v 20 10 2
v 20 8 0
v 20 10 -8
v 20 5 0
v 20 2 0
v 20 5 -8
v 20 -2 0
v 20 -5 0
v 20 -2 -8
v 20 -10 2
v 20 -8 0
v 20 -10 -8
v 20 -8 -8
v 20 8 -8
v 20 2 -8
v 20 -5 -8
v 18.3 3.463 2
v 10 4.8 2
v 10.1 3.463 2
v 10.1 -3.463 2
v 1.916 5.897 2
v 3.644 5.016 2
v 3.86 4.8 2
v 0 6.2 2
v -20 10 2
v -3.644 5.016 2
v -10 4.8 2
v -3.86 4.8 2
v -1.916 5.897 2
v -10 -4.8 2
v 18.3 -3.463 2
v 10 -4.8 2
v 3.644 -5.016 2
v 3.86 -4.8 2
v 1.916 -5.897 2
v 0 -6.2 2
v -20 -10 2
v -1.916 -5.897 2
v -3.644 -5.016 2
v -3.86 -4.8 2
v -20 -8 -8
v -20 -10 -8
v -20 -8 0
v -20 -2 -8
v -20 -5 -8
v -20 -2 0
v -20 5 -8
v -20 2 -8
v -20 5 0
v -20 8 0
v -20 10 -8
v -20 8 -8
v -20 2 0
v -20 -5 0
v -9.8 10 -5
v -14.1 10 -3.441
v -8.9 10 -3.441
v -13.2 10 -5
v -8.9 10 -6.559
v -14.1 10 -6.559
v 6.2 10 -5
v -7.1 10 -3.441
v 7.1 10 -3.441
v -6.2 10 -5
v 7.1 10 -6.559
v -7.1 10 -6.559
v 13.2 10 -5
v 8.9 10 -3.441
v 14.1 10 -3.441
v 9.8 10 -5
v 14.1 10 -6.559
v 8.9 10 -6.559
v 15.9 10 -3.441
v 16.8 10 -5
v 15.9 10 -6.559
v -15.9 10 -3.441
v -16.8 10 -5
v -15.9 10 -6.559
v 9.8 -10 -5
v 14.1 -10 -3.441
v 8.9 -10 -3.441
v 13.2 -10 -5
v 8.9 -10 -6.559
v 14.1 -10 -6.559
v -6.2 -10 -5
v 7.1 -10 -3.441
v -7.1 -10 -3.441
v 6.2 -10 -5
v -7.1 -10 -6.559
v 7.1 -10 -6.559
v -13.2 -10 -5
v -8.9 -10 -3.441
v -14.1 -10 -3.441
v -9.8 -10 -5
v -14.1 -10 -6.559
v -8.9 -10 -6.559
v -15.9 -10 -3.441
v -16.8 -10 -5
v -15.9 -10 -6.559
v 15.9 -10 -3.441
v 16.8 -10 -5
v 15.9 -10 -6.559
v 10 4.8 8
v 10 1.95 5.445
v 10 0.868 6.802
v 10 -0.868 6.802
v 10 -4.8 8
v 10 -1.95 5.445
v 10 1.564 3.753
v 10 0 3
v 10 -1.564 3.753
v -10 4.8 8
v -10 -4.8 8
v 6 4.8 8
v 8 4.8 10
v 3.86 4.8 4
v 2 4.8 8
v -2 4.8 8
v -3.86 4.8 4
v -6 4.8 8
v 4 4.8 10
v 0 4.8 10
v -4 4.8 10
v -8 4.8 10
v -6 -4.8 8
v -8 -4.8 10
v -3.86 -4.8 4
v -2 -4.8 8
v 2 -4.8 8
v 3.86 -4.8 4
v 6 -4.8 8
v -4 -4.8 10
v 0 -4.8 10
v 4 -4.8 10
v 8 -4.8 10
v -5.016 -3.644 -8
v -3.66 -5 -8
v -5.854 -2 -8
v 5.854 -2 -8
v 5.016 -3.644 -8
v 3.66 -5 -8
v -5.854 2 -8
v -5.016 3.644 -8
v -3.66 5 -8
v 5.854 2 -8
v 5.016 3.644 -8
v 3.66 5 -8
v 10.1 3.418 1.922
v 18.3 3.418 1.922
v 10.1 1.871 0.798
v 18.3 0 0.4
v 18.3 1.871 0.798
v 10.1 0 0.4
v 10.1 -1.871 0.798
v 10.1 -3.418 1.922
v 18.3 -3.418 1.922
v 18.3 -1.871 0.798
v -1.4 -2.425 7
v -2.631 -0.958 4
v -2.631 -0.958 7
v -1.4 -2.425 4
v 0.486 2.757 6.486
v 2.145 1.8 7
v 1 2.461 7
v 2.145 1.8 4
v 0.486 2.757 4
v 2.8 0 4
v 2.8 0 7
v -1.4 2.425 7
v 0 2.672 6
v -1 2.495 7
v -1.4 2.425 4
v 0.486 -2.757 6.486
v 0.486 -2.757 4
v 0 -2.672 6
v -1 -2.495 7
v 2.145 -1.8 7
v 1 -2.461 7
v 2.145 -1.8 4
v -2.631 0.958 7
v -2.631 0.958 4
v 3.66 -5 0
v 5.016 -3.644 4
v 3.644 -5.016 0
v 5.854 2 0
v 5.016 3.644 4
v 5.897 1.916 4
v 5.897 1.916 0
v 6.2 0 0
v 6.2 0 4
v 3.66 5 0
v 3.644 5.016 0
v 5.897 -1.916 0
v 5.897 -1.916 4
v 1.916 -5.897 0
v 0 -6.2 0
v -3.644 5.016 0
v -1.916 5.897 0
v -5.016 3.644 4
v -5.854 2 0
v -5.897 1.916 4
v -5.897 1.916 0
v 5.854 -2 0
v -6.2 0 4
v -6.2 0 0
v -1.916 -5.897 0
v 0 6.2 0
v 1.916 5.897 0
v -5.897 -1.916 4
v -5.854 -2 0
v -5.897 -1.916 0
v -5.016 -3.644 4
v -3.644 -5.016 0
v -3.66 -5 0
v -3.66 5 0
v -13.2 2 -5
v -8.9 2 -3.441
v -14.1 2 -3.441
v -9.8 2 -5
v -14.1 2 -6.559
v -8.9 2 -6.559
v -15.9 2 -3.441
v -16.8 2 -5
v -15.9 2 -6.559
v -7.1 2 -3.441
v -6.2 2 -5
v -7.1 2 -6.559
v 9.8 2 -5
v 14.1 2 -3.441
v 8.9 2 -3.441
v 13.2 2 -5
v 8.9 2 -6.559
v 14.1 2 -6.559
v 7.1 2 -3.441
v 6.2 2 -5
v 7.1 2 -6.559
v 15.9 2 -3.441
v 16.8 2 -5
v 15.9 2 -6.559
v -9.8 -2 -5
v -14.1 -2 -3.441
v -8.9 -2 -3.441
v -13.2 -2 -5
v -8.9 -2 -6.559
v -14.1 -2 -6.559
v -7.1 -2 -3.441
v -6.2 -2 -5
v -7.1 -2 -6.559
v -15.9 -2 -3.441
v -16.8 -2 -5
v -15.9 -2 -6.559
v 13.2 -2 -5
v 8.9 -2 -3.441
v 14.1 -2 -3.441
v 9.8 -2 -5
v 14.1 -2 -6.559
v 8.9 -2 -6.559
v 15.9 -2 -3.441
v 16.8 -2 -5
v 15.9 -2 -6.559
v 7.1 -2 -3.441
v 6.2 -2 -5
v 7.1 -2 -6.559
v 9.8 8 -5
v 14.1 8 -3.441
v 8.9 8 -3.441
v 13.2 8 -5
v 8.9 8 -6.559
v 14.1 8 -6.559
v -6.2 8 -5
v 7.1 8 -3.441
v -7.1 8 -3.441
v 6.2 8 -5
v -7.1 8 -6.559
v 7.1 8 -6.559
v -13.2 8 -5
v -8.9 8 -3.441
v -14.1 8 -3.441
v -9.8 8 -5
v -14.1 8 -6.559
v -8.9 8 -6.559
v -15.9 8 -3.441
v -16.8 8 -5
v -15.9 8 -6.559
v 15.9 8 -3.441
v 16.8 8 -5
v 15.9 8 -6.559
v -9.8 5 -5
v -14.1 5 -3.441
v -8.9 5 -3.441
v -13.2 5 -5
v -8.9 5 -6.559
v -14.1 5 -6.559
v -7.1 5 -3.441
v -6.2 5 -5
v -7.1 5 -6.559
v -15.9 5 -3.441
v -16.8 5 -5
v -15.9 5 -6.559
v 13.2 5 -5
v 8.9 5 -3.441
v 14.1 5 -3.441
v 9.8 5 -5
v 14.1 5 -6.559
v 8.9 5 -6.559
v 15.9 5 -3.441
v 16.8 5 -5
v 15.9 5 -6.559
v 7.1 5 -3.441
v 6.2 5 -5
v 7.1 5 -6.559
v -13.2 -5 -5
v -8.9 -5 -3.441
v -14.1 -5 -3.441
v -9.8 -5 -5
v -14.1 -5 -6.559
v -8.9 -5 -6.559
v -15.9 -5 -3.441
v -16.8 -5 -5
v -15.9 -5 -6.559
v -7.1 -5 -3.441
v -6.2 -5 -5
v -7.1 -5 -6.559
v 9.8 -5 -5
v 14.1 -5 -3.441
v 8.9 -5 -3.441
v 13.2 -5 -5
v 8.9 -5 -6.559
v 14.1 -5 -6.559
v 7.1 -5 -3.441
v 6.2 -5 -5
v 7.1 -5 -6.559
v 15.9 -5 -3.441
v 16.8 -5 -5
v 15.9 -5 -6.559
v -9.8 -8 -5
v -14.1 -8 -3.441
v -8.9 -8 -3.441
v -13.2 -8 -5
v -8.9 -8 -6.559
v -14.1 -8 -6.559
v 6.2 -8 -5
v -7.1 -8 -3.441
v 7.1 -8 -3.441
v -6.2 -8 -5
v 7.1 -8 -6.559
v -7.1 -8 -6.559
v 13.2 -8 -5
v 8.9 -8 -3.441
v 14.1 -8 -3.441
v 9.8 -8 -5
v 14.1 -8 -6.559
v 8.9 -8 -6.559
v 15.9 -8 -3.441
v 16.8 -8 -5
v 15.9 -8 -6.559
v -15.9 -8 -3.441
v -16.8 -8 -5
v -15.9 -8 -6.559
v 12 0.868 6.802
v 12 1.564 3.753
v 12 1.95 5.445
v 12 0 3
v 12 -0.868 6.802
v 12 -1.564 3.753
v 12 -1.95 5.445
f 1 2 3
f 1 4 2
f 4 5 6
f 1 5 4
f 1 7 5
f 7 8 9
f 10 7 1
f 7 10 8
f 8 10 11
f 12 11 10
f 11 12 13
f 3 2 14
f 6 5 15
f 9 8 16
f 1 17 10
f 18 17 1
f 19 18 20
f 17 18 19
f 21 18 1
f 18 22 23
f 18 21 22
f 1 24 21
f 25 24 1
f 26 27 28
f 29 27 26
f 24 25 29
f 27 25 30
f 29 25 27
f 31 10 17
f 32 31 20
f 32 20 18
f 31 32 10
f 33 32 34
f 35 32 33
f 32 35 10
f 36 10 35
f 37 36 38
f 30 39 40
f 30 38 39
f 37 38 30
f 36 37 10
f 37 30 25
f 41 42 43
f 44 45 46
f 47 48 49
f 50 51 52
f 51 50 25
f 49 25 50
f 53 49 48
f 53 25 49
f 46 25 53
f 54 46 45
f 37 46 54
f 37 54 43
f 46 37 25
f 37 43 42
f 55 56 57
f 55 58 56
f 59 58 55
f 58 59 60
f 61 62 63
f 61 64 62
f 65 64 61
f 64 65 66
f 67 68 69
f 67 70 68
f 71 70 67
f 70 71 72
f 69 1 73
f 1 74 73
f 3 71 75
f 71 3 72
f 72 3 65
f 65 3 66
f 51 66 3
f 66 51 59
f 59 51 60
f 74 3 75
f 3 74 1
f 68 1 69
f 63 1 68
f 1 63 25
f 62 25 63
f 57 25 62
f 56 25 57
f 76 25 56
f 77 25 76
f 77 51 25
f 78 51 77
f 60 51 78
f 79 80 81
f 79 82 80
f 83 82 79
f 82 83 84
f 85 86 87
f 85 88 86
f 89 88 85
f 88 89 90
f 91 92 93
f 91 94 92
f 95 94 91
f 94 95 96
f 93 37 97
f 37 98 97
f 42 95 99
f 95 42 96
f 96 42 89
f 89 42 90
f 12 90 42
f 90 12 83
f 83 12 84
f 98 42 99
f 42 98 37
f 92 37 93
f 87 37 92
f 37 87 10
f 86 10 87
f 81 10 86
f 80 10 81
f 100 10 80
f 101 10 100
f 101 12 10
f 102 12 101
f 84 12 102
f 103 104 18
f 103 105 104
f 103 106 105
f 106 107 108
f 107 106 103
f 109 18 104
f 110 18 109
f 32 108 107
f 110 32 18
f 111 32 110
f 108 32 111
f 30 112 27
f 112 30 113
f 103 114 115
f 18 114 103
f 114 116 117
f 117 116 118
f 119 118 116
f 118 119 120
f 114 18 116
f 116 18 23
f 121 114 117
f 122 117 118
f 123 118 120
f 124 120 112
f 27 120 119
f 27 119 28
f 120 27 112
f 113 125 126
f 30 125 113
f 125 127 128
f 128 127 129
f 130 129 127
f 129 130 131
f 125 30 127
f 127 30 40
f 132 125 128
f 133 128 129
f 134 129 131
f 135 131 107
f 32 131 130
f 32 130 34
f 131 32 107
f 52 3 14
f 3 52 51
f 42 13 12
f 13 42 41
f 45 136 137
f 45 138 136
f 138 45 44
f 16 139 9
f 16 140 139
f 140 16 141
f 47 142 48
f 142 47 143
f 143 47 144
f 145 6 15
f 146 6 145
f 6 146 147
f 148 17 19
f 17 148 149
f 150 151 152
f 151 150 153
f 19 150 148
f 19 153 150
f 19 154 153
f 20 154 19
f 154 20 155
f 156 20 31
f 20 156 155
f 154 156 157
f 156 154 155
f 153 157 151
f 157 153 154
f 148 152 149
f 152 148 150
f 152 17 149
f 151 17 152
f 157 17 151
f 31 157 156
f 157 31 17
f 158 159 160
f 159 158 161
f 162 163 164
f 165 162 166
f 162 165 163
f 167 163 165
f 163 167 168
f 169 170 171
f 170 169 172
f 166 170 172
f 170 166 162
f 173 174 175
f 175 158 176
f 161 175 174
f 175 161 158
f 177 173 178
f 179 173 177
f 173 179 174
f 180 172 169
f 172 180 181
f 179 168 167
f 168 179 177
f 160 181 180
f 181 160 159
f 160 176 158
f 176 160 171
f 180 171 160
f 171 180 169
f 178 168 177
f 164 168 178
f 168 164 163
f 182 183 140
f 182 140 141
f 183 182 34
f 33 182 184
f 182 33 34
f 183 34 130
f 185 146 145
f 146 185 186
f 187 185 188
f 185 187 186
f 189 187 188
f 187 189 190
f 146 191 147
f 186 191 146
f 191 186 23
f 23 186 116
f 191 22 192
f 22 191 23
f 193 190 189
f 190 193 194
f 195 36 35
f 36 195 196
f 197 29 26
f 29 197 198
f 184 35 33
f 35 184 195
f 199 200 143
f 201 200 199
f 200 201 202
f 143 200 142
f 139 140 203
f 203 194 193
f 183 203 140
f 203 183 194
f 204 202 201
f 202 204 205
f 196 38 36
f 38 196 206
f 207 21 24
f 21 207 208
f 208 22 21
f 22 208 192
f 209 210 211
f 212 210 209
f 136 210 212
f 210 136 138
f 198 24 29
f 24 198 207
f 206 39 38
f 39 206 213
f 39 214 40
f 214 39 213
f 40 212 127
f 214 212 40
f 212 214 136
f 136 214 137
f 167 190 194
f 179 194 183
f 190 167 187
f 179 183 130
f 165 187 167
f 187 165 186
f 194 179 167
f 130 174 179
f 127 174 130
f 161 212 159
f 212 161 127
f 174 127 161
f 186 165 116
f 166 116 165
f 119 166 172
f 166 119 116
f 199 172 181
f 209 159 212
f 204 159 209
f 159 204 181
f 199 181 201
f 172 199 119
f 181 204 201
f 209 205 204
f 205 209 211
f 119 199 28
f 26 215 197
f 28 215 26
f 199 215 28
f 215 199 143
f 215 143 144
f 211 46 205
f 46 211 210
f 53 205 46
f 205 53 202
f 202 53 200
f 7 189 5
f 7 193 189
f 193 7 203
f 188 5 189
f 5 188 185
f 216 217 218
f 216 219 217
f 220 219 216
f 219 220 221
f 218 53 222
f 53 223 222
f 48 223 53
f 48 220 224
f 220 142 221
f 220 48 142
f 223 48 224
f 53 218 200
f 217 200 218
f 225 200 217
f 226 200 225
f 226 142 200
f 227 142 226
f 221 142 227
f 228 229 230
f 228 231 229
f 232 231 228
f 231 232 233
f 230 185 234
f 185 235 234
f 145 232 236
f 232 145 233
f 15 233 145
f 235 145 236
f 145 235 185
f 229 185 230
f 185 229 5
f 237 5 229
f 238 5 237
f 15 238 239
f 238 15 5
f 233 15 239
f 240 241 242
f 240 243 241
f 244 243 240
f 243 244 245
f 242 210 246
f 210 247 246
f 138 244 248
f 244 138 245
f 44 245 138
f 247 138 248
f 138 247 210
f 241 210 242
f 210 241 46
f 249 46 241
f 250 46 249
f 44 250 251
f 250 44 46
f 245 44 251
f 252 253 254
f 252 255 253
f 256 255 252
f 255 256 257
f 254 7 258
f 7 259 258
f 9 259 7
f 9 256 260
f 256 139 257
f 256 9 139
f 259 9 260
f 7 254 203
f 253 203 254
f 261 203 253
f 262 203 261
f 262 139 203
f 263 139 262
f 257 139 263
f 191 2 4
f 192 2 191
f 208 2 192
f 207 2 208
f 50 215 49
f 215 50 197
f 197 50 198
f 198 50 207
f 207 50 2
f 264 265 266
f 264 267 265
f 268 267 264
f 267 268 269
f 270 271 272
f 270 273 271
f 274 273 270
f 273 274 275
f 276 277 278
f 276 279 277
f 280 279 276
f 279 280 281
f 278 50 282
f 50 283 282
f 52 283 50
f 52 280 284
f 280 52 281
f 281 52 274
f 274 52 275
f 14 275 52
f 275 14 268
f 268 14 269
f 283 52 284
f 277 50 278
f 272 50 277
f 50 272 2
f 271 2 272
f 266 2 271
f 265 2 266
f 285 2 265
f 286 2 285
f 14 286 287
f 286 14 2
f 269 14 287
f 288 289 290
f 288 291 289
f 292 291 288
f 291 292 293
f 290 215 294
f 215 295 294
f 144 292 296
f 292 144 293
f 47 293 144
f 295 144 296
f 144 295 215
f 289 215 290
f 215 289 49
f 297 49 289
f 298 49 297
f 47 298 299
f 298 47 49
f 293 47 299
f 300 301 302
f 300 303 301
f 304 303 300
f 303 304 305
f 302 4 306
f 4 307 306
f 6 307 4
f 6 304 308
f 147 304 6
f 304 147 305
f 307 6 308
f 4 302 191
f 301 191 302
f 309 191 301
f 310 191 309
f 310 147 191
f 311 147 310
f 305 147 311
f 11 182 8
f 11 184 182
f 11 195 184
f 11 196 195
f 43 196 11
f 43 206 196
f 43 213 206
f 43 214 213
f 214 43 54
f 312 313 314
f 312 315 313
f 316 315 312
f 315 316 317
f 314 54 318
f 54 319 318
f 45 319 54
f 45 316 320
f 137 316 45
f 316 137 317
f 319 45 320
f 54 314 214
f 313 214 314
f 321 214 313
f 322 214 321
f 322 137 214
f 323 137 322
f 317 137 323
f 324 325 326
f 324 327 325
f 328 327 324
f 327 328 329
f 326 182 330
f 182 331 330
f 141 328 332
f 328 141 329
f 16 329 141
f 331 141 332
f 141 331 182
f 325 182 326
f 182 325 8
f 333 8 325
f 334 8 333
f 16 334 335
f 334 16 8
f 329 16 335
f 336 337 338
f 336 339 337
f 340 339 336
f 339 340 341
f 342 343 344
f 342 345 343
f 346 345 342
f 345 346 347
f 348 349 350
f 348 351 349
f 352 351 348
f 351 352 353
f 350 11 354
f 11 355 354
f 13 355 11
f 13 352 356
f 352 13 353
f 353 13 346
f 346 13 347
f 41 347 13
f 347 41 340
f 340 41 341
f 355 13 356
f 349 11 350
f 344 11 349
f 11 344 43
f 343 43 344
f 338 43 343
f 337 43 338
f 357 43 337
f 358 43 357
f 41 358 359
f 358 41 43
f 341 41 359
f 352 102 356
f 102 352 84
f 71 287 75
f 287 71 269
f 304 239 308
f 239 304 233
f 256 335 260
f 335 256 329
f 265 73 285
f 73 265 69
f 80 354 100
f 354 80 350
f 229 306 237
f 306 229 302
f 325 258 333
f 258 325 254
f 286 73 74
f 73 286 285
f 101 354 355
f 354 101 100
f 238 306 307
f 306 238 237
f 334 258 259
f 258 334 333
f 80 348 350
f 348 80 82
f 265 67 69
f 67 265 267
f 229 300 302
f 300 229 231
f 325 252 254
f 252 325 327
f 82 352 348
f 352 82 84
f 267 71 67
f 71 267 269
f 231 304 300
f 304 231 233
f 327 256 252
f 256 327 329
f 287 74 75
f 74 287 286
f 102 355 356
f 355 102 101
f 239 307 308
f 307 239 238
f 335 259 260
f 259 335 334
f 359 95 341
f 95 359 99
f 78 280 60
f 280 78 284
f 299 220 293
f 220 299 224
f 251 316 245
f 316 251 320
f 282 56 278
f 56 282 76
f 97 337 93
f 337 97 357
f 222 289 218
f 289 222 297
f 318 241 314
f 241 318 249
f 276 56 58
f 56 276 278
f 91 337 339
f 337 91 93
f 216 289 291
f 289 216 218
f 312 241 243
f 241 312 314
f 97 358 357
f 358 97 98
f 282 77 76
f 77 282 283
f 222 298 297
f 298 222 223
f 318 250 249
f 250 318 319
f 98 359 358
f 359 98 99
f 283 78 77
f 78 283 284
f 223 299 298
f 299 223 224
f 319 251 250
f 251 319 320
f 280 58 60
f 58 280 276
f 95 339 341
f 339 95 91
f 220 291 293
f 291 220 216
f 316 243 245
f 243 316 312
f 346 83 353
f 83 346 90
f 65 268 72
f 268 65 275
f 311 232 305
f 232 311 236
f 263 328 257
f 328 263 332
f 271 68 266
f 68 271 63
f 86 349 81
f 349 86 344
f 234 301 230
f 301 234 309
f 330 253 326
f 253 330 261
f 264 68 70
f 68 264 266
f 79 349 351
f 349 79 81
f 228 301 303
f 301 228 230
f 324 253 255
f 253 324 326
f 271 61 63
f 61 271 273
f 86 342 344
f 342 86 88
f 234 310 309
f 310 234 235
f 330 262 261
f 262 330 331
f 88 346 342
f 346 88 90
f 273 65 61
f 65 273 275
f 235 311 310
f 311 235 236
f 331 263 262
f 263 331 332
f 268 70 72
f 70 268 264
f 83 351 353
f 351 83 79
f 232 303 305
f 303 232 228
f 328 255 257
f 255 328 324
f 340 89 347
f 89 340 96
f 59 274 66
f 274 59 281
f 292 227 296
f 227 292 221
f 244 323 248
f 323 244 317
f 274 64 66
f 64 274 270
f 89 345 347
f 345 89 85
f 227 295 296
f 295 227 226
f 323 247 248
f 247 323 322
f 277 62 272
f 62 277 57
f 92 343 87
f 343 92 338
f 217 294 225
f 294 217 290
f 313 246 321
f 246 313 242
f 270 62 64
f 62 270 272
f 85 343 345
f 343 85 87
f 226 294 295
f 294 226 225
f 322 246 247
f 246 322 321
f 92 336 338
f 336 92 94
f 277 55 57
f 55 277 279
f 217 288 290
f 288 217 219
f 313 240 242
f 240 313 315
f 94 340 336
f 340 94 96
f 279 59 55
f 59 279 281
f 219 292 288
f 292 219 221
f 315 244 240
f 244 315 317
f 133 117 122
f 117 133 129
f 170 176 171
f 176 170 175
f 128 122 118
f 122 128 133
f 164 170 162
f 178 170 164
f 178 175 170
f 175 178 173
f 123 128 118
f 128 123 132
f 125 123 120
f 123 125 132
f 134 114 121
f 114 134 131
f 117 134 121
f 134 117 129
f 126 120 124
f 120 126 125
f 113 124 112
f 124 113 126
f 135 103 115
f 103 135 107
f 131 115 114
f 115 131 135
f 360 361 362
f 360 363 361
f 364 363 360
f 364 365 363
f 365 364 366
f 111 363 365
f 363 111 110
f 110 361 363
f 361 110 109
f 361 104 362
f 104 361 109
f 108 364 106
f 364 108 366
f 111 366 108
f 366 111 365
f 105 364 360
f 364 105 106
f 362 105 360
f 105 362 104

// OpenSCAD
union () {
  difference () {
    cube ([40, 20, 16], center=true);
    translate ([0, 0, 5]) {
      difference () {
        cube ([40, 20, 6], center=true);
        cube ([20, 9.6, 6], center=true);
      }
    }
    translate ([14.2, 0, 5]) {
      rotate (a=90.0, v=[0, 1, 0]) {
        cylinder (h=8.2, r=4.6, center=true);
      }
    }
    cylinder (h=14, r=2.8, center=true);
    translate ([0, 0, -2]) {
      cylinder (h=12, r=6.2, center=true);
    }
    translate ([0, 0, -4]) {
      cube ([40, 4, 8], center=true);
    }
    translate ([0, 6.5, -4]) {
      cube ([40, 3, 8], center=true);
    }
    translate ([0, -6.5, -4]) {
      cube ([40, 3, 8], center=true);
    }
    translate ([15, 0, -5]) {
      rotate (a=90.0, v=[1, 0, 0]) {
        cylinder (h=20, r=1.8, center=true);
      }
    }
    translate ([-15, 0, -5]) {
      rotate (a=90.0, v=[1, 0, 0]) {
        cylinder (h=20, r=1.8, center=true);
      }
    }
    translate ([8, 0, -5]) {
      rotate (a=90.0, v=[1, 0, 0]) {
        cylinder (h=20, r=1.8, center=true);
      }
    }
    translate ([-8, 0, -5]) {
      rotate (a=90.0, v=[1, 0, 0]) {
        cylinder (h=20, r=1.8, center=true);
      }
    }
  }
  translate ([11, 0, 5]) {
    rotate (a=90.0, v=[0, 1, 0]) {
      cylinder (h=2, r=2, center=true);
    }
  }
  translate ([0, 0, 8]) {
    rotate (a=90.0, v=[1, 0, 0]) {
      union () {
        rotate (a=45.0, v=[0, 0, 1]) {
          cube ([2.8284271247461903, 2.8284271247461903, 9.6], center=true);
        }
        translate ([-4, 0, 0]) {
          rotate (a=45.0, v=[0, 0, 1]) {
            cube ([2.8284271247461903, 2.8284271247461903, 9.6], center=true);
          }
        }
        translate ([4, 0, 0]) {
          rotate (a=45.0, v=[0, 0, 1]) {
            cube ([2.8284271247461903, 2.8284271247461903, 9.6], center=true);
          }
        }
        translate ([-8, 0, 0]) {
          rotate (a=45.0, v=[0, 0, 1]) {
            cube ([2.8284271247461903, 2.8284271247461903, 9.6], center=true);
          }
        }
        translate ([8, 0, 0]) {
          rotate (a=45.0, v=[0, 0, 1]) {
            cube ([2.8284271247461903, 2.8284271247461903, 9.6], center=true);
          }
        }
      }
    }
  }
}
